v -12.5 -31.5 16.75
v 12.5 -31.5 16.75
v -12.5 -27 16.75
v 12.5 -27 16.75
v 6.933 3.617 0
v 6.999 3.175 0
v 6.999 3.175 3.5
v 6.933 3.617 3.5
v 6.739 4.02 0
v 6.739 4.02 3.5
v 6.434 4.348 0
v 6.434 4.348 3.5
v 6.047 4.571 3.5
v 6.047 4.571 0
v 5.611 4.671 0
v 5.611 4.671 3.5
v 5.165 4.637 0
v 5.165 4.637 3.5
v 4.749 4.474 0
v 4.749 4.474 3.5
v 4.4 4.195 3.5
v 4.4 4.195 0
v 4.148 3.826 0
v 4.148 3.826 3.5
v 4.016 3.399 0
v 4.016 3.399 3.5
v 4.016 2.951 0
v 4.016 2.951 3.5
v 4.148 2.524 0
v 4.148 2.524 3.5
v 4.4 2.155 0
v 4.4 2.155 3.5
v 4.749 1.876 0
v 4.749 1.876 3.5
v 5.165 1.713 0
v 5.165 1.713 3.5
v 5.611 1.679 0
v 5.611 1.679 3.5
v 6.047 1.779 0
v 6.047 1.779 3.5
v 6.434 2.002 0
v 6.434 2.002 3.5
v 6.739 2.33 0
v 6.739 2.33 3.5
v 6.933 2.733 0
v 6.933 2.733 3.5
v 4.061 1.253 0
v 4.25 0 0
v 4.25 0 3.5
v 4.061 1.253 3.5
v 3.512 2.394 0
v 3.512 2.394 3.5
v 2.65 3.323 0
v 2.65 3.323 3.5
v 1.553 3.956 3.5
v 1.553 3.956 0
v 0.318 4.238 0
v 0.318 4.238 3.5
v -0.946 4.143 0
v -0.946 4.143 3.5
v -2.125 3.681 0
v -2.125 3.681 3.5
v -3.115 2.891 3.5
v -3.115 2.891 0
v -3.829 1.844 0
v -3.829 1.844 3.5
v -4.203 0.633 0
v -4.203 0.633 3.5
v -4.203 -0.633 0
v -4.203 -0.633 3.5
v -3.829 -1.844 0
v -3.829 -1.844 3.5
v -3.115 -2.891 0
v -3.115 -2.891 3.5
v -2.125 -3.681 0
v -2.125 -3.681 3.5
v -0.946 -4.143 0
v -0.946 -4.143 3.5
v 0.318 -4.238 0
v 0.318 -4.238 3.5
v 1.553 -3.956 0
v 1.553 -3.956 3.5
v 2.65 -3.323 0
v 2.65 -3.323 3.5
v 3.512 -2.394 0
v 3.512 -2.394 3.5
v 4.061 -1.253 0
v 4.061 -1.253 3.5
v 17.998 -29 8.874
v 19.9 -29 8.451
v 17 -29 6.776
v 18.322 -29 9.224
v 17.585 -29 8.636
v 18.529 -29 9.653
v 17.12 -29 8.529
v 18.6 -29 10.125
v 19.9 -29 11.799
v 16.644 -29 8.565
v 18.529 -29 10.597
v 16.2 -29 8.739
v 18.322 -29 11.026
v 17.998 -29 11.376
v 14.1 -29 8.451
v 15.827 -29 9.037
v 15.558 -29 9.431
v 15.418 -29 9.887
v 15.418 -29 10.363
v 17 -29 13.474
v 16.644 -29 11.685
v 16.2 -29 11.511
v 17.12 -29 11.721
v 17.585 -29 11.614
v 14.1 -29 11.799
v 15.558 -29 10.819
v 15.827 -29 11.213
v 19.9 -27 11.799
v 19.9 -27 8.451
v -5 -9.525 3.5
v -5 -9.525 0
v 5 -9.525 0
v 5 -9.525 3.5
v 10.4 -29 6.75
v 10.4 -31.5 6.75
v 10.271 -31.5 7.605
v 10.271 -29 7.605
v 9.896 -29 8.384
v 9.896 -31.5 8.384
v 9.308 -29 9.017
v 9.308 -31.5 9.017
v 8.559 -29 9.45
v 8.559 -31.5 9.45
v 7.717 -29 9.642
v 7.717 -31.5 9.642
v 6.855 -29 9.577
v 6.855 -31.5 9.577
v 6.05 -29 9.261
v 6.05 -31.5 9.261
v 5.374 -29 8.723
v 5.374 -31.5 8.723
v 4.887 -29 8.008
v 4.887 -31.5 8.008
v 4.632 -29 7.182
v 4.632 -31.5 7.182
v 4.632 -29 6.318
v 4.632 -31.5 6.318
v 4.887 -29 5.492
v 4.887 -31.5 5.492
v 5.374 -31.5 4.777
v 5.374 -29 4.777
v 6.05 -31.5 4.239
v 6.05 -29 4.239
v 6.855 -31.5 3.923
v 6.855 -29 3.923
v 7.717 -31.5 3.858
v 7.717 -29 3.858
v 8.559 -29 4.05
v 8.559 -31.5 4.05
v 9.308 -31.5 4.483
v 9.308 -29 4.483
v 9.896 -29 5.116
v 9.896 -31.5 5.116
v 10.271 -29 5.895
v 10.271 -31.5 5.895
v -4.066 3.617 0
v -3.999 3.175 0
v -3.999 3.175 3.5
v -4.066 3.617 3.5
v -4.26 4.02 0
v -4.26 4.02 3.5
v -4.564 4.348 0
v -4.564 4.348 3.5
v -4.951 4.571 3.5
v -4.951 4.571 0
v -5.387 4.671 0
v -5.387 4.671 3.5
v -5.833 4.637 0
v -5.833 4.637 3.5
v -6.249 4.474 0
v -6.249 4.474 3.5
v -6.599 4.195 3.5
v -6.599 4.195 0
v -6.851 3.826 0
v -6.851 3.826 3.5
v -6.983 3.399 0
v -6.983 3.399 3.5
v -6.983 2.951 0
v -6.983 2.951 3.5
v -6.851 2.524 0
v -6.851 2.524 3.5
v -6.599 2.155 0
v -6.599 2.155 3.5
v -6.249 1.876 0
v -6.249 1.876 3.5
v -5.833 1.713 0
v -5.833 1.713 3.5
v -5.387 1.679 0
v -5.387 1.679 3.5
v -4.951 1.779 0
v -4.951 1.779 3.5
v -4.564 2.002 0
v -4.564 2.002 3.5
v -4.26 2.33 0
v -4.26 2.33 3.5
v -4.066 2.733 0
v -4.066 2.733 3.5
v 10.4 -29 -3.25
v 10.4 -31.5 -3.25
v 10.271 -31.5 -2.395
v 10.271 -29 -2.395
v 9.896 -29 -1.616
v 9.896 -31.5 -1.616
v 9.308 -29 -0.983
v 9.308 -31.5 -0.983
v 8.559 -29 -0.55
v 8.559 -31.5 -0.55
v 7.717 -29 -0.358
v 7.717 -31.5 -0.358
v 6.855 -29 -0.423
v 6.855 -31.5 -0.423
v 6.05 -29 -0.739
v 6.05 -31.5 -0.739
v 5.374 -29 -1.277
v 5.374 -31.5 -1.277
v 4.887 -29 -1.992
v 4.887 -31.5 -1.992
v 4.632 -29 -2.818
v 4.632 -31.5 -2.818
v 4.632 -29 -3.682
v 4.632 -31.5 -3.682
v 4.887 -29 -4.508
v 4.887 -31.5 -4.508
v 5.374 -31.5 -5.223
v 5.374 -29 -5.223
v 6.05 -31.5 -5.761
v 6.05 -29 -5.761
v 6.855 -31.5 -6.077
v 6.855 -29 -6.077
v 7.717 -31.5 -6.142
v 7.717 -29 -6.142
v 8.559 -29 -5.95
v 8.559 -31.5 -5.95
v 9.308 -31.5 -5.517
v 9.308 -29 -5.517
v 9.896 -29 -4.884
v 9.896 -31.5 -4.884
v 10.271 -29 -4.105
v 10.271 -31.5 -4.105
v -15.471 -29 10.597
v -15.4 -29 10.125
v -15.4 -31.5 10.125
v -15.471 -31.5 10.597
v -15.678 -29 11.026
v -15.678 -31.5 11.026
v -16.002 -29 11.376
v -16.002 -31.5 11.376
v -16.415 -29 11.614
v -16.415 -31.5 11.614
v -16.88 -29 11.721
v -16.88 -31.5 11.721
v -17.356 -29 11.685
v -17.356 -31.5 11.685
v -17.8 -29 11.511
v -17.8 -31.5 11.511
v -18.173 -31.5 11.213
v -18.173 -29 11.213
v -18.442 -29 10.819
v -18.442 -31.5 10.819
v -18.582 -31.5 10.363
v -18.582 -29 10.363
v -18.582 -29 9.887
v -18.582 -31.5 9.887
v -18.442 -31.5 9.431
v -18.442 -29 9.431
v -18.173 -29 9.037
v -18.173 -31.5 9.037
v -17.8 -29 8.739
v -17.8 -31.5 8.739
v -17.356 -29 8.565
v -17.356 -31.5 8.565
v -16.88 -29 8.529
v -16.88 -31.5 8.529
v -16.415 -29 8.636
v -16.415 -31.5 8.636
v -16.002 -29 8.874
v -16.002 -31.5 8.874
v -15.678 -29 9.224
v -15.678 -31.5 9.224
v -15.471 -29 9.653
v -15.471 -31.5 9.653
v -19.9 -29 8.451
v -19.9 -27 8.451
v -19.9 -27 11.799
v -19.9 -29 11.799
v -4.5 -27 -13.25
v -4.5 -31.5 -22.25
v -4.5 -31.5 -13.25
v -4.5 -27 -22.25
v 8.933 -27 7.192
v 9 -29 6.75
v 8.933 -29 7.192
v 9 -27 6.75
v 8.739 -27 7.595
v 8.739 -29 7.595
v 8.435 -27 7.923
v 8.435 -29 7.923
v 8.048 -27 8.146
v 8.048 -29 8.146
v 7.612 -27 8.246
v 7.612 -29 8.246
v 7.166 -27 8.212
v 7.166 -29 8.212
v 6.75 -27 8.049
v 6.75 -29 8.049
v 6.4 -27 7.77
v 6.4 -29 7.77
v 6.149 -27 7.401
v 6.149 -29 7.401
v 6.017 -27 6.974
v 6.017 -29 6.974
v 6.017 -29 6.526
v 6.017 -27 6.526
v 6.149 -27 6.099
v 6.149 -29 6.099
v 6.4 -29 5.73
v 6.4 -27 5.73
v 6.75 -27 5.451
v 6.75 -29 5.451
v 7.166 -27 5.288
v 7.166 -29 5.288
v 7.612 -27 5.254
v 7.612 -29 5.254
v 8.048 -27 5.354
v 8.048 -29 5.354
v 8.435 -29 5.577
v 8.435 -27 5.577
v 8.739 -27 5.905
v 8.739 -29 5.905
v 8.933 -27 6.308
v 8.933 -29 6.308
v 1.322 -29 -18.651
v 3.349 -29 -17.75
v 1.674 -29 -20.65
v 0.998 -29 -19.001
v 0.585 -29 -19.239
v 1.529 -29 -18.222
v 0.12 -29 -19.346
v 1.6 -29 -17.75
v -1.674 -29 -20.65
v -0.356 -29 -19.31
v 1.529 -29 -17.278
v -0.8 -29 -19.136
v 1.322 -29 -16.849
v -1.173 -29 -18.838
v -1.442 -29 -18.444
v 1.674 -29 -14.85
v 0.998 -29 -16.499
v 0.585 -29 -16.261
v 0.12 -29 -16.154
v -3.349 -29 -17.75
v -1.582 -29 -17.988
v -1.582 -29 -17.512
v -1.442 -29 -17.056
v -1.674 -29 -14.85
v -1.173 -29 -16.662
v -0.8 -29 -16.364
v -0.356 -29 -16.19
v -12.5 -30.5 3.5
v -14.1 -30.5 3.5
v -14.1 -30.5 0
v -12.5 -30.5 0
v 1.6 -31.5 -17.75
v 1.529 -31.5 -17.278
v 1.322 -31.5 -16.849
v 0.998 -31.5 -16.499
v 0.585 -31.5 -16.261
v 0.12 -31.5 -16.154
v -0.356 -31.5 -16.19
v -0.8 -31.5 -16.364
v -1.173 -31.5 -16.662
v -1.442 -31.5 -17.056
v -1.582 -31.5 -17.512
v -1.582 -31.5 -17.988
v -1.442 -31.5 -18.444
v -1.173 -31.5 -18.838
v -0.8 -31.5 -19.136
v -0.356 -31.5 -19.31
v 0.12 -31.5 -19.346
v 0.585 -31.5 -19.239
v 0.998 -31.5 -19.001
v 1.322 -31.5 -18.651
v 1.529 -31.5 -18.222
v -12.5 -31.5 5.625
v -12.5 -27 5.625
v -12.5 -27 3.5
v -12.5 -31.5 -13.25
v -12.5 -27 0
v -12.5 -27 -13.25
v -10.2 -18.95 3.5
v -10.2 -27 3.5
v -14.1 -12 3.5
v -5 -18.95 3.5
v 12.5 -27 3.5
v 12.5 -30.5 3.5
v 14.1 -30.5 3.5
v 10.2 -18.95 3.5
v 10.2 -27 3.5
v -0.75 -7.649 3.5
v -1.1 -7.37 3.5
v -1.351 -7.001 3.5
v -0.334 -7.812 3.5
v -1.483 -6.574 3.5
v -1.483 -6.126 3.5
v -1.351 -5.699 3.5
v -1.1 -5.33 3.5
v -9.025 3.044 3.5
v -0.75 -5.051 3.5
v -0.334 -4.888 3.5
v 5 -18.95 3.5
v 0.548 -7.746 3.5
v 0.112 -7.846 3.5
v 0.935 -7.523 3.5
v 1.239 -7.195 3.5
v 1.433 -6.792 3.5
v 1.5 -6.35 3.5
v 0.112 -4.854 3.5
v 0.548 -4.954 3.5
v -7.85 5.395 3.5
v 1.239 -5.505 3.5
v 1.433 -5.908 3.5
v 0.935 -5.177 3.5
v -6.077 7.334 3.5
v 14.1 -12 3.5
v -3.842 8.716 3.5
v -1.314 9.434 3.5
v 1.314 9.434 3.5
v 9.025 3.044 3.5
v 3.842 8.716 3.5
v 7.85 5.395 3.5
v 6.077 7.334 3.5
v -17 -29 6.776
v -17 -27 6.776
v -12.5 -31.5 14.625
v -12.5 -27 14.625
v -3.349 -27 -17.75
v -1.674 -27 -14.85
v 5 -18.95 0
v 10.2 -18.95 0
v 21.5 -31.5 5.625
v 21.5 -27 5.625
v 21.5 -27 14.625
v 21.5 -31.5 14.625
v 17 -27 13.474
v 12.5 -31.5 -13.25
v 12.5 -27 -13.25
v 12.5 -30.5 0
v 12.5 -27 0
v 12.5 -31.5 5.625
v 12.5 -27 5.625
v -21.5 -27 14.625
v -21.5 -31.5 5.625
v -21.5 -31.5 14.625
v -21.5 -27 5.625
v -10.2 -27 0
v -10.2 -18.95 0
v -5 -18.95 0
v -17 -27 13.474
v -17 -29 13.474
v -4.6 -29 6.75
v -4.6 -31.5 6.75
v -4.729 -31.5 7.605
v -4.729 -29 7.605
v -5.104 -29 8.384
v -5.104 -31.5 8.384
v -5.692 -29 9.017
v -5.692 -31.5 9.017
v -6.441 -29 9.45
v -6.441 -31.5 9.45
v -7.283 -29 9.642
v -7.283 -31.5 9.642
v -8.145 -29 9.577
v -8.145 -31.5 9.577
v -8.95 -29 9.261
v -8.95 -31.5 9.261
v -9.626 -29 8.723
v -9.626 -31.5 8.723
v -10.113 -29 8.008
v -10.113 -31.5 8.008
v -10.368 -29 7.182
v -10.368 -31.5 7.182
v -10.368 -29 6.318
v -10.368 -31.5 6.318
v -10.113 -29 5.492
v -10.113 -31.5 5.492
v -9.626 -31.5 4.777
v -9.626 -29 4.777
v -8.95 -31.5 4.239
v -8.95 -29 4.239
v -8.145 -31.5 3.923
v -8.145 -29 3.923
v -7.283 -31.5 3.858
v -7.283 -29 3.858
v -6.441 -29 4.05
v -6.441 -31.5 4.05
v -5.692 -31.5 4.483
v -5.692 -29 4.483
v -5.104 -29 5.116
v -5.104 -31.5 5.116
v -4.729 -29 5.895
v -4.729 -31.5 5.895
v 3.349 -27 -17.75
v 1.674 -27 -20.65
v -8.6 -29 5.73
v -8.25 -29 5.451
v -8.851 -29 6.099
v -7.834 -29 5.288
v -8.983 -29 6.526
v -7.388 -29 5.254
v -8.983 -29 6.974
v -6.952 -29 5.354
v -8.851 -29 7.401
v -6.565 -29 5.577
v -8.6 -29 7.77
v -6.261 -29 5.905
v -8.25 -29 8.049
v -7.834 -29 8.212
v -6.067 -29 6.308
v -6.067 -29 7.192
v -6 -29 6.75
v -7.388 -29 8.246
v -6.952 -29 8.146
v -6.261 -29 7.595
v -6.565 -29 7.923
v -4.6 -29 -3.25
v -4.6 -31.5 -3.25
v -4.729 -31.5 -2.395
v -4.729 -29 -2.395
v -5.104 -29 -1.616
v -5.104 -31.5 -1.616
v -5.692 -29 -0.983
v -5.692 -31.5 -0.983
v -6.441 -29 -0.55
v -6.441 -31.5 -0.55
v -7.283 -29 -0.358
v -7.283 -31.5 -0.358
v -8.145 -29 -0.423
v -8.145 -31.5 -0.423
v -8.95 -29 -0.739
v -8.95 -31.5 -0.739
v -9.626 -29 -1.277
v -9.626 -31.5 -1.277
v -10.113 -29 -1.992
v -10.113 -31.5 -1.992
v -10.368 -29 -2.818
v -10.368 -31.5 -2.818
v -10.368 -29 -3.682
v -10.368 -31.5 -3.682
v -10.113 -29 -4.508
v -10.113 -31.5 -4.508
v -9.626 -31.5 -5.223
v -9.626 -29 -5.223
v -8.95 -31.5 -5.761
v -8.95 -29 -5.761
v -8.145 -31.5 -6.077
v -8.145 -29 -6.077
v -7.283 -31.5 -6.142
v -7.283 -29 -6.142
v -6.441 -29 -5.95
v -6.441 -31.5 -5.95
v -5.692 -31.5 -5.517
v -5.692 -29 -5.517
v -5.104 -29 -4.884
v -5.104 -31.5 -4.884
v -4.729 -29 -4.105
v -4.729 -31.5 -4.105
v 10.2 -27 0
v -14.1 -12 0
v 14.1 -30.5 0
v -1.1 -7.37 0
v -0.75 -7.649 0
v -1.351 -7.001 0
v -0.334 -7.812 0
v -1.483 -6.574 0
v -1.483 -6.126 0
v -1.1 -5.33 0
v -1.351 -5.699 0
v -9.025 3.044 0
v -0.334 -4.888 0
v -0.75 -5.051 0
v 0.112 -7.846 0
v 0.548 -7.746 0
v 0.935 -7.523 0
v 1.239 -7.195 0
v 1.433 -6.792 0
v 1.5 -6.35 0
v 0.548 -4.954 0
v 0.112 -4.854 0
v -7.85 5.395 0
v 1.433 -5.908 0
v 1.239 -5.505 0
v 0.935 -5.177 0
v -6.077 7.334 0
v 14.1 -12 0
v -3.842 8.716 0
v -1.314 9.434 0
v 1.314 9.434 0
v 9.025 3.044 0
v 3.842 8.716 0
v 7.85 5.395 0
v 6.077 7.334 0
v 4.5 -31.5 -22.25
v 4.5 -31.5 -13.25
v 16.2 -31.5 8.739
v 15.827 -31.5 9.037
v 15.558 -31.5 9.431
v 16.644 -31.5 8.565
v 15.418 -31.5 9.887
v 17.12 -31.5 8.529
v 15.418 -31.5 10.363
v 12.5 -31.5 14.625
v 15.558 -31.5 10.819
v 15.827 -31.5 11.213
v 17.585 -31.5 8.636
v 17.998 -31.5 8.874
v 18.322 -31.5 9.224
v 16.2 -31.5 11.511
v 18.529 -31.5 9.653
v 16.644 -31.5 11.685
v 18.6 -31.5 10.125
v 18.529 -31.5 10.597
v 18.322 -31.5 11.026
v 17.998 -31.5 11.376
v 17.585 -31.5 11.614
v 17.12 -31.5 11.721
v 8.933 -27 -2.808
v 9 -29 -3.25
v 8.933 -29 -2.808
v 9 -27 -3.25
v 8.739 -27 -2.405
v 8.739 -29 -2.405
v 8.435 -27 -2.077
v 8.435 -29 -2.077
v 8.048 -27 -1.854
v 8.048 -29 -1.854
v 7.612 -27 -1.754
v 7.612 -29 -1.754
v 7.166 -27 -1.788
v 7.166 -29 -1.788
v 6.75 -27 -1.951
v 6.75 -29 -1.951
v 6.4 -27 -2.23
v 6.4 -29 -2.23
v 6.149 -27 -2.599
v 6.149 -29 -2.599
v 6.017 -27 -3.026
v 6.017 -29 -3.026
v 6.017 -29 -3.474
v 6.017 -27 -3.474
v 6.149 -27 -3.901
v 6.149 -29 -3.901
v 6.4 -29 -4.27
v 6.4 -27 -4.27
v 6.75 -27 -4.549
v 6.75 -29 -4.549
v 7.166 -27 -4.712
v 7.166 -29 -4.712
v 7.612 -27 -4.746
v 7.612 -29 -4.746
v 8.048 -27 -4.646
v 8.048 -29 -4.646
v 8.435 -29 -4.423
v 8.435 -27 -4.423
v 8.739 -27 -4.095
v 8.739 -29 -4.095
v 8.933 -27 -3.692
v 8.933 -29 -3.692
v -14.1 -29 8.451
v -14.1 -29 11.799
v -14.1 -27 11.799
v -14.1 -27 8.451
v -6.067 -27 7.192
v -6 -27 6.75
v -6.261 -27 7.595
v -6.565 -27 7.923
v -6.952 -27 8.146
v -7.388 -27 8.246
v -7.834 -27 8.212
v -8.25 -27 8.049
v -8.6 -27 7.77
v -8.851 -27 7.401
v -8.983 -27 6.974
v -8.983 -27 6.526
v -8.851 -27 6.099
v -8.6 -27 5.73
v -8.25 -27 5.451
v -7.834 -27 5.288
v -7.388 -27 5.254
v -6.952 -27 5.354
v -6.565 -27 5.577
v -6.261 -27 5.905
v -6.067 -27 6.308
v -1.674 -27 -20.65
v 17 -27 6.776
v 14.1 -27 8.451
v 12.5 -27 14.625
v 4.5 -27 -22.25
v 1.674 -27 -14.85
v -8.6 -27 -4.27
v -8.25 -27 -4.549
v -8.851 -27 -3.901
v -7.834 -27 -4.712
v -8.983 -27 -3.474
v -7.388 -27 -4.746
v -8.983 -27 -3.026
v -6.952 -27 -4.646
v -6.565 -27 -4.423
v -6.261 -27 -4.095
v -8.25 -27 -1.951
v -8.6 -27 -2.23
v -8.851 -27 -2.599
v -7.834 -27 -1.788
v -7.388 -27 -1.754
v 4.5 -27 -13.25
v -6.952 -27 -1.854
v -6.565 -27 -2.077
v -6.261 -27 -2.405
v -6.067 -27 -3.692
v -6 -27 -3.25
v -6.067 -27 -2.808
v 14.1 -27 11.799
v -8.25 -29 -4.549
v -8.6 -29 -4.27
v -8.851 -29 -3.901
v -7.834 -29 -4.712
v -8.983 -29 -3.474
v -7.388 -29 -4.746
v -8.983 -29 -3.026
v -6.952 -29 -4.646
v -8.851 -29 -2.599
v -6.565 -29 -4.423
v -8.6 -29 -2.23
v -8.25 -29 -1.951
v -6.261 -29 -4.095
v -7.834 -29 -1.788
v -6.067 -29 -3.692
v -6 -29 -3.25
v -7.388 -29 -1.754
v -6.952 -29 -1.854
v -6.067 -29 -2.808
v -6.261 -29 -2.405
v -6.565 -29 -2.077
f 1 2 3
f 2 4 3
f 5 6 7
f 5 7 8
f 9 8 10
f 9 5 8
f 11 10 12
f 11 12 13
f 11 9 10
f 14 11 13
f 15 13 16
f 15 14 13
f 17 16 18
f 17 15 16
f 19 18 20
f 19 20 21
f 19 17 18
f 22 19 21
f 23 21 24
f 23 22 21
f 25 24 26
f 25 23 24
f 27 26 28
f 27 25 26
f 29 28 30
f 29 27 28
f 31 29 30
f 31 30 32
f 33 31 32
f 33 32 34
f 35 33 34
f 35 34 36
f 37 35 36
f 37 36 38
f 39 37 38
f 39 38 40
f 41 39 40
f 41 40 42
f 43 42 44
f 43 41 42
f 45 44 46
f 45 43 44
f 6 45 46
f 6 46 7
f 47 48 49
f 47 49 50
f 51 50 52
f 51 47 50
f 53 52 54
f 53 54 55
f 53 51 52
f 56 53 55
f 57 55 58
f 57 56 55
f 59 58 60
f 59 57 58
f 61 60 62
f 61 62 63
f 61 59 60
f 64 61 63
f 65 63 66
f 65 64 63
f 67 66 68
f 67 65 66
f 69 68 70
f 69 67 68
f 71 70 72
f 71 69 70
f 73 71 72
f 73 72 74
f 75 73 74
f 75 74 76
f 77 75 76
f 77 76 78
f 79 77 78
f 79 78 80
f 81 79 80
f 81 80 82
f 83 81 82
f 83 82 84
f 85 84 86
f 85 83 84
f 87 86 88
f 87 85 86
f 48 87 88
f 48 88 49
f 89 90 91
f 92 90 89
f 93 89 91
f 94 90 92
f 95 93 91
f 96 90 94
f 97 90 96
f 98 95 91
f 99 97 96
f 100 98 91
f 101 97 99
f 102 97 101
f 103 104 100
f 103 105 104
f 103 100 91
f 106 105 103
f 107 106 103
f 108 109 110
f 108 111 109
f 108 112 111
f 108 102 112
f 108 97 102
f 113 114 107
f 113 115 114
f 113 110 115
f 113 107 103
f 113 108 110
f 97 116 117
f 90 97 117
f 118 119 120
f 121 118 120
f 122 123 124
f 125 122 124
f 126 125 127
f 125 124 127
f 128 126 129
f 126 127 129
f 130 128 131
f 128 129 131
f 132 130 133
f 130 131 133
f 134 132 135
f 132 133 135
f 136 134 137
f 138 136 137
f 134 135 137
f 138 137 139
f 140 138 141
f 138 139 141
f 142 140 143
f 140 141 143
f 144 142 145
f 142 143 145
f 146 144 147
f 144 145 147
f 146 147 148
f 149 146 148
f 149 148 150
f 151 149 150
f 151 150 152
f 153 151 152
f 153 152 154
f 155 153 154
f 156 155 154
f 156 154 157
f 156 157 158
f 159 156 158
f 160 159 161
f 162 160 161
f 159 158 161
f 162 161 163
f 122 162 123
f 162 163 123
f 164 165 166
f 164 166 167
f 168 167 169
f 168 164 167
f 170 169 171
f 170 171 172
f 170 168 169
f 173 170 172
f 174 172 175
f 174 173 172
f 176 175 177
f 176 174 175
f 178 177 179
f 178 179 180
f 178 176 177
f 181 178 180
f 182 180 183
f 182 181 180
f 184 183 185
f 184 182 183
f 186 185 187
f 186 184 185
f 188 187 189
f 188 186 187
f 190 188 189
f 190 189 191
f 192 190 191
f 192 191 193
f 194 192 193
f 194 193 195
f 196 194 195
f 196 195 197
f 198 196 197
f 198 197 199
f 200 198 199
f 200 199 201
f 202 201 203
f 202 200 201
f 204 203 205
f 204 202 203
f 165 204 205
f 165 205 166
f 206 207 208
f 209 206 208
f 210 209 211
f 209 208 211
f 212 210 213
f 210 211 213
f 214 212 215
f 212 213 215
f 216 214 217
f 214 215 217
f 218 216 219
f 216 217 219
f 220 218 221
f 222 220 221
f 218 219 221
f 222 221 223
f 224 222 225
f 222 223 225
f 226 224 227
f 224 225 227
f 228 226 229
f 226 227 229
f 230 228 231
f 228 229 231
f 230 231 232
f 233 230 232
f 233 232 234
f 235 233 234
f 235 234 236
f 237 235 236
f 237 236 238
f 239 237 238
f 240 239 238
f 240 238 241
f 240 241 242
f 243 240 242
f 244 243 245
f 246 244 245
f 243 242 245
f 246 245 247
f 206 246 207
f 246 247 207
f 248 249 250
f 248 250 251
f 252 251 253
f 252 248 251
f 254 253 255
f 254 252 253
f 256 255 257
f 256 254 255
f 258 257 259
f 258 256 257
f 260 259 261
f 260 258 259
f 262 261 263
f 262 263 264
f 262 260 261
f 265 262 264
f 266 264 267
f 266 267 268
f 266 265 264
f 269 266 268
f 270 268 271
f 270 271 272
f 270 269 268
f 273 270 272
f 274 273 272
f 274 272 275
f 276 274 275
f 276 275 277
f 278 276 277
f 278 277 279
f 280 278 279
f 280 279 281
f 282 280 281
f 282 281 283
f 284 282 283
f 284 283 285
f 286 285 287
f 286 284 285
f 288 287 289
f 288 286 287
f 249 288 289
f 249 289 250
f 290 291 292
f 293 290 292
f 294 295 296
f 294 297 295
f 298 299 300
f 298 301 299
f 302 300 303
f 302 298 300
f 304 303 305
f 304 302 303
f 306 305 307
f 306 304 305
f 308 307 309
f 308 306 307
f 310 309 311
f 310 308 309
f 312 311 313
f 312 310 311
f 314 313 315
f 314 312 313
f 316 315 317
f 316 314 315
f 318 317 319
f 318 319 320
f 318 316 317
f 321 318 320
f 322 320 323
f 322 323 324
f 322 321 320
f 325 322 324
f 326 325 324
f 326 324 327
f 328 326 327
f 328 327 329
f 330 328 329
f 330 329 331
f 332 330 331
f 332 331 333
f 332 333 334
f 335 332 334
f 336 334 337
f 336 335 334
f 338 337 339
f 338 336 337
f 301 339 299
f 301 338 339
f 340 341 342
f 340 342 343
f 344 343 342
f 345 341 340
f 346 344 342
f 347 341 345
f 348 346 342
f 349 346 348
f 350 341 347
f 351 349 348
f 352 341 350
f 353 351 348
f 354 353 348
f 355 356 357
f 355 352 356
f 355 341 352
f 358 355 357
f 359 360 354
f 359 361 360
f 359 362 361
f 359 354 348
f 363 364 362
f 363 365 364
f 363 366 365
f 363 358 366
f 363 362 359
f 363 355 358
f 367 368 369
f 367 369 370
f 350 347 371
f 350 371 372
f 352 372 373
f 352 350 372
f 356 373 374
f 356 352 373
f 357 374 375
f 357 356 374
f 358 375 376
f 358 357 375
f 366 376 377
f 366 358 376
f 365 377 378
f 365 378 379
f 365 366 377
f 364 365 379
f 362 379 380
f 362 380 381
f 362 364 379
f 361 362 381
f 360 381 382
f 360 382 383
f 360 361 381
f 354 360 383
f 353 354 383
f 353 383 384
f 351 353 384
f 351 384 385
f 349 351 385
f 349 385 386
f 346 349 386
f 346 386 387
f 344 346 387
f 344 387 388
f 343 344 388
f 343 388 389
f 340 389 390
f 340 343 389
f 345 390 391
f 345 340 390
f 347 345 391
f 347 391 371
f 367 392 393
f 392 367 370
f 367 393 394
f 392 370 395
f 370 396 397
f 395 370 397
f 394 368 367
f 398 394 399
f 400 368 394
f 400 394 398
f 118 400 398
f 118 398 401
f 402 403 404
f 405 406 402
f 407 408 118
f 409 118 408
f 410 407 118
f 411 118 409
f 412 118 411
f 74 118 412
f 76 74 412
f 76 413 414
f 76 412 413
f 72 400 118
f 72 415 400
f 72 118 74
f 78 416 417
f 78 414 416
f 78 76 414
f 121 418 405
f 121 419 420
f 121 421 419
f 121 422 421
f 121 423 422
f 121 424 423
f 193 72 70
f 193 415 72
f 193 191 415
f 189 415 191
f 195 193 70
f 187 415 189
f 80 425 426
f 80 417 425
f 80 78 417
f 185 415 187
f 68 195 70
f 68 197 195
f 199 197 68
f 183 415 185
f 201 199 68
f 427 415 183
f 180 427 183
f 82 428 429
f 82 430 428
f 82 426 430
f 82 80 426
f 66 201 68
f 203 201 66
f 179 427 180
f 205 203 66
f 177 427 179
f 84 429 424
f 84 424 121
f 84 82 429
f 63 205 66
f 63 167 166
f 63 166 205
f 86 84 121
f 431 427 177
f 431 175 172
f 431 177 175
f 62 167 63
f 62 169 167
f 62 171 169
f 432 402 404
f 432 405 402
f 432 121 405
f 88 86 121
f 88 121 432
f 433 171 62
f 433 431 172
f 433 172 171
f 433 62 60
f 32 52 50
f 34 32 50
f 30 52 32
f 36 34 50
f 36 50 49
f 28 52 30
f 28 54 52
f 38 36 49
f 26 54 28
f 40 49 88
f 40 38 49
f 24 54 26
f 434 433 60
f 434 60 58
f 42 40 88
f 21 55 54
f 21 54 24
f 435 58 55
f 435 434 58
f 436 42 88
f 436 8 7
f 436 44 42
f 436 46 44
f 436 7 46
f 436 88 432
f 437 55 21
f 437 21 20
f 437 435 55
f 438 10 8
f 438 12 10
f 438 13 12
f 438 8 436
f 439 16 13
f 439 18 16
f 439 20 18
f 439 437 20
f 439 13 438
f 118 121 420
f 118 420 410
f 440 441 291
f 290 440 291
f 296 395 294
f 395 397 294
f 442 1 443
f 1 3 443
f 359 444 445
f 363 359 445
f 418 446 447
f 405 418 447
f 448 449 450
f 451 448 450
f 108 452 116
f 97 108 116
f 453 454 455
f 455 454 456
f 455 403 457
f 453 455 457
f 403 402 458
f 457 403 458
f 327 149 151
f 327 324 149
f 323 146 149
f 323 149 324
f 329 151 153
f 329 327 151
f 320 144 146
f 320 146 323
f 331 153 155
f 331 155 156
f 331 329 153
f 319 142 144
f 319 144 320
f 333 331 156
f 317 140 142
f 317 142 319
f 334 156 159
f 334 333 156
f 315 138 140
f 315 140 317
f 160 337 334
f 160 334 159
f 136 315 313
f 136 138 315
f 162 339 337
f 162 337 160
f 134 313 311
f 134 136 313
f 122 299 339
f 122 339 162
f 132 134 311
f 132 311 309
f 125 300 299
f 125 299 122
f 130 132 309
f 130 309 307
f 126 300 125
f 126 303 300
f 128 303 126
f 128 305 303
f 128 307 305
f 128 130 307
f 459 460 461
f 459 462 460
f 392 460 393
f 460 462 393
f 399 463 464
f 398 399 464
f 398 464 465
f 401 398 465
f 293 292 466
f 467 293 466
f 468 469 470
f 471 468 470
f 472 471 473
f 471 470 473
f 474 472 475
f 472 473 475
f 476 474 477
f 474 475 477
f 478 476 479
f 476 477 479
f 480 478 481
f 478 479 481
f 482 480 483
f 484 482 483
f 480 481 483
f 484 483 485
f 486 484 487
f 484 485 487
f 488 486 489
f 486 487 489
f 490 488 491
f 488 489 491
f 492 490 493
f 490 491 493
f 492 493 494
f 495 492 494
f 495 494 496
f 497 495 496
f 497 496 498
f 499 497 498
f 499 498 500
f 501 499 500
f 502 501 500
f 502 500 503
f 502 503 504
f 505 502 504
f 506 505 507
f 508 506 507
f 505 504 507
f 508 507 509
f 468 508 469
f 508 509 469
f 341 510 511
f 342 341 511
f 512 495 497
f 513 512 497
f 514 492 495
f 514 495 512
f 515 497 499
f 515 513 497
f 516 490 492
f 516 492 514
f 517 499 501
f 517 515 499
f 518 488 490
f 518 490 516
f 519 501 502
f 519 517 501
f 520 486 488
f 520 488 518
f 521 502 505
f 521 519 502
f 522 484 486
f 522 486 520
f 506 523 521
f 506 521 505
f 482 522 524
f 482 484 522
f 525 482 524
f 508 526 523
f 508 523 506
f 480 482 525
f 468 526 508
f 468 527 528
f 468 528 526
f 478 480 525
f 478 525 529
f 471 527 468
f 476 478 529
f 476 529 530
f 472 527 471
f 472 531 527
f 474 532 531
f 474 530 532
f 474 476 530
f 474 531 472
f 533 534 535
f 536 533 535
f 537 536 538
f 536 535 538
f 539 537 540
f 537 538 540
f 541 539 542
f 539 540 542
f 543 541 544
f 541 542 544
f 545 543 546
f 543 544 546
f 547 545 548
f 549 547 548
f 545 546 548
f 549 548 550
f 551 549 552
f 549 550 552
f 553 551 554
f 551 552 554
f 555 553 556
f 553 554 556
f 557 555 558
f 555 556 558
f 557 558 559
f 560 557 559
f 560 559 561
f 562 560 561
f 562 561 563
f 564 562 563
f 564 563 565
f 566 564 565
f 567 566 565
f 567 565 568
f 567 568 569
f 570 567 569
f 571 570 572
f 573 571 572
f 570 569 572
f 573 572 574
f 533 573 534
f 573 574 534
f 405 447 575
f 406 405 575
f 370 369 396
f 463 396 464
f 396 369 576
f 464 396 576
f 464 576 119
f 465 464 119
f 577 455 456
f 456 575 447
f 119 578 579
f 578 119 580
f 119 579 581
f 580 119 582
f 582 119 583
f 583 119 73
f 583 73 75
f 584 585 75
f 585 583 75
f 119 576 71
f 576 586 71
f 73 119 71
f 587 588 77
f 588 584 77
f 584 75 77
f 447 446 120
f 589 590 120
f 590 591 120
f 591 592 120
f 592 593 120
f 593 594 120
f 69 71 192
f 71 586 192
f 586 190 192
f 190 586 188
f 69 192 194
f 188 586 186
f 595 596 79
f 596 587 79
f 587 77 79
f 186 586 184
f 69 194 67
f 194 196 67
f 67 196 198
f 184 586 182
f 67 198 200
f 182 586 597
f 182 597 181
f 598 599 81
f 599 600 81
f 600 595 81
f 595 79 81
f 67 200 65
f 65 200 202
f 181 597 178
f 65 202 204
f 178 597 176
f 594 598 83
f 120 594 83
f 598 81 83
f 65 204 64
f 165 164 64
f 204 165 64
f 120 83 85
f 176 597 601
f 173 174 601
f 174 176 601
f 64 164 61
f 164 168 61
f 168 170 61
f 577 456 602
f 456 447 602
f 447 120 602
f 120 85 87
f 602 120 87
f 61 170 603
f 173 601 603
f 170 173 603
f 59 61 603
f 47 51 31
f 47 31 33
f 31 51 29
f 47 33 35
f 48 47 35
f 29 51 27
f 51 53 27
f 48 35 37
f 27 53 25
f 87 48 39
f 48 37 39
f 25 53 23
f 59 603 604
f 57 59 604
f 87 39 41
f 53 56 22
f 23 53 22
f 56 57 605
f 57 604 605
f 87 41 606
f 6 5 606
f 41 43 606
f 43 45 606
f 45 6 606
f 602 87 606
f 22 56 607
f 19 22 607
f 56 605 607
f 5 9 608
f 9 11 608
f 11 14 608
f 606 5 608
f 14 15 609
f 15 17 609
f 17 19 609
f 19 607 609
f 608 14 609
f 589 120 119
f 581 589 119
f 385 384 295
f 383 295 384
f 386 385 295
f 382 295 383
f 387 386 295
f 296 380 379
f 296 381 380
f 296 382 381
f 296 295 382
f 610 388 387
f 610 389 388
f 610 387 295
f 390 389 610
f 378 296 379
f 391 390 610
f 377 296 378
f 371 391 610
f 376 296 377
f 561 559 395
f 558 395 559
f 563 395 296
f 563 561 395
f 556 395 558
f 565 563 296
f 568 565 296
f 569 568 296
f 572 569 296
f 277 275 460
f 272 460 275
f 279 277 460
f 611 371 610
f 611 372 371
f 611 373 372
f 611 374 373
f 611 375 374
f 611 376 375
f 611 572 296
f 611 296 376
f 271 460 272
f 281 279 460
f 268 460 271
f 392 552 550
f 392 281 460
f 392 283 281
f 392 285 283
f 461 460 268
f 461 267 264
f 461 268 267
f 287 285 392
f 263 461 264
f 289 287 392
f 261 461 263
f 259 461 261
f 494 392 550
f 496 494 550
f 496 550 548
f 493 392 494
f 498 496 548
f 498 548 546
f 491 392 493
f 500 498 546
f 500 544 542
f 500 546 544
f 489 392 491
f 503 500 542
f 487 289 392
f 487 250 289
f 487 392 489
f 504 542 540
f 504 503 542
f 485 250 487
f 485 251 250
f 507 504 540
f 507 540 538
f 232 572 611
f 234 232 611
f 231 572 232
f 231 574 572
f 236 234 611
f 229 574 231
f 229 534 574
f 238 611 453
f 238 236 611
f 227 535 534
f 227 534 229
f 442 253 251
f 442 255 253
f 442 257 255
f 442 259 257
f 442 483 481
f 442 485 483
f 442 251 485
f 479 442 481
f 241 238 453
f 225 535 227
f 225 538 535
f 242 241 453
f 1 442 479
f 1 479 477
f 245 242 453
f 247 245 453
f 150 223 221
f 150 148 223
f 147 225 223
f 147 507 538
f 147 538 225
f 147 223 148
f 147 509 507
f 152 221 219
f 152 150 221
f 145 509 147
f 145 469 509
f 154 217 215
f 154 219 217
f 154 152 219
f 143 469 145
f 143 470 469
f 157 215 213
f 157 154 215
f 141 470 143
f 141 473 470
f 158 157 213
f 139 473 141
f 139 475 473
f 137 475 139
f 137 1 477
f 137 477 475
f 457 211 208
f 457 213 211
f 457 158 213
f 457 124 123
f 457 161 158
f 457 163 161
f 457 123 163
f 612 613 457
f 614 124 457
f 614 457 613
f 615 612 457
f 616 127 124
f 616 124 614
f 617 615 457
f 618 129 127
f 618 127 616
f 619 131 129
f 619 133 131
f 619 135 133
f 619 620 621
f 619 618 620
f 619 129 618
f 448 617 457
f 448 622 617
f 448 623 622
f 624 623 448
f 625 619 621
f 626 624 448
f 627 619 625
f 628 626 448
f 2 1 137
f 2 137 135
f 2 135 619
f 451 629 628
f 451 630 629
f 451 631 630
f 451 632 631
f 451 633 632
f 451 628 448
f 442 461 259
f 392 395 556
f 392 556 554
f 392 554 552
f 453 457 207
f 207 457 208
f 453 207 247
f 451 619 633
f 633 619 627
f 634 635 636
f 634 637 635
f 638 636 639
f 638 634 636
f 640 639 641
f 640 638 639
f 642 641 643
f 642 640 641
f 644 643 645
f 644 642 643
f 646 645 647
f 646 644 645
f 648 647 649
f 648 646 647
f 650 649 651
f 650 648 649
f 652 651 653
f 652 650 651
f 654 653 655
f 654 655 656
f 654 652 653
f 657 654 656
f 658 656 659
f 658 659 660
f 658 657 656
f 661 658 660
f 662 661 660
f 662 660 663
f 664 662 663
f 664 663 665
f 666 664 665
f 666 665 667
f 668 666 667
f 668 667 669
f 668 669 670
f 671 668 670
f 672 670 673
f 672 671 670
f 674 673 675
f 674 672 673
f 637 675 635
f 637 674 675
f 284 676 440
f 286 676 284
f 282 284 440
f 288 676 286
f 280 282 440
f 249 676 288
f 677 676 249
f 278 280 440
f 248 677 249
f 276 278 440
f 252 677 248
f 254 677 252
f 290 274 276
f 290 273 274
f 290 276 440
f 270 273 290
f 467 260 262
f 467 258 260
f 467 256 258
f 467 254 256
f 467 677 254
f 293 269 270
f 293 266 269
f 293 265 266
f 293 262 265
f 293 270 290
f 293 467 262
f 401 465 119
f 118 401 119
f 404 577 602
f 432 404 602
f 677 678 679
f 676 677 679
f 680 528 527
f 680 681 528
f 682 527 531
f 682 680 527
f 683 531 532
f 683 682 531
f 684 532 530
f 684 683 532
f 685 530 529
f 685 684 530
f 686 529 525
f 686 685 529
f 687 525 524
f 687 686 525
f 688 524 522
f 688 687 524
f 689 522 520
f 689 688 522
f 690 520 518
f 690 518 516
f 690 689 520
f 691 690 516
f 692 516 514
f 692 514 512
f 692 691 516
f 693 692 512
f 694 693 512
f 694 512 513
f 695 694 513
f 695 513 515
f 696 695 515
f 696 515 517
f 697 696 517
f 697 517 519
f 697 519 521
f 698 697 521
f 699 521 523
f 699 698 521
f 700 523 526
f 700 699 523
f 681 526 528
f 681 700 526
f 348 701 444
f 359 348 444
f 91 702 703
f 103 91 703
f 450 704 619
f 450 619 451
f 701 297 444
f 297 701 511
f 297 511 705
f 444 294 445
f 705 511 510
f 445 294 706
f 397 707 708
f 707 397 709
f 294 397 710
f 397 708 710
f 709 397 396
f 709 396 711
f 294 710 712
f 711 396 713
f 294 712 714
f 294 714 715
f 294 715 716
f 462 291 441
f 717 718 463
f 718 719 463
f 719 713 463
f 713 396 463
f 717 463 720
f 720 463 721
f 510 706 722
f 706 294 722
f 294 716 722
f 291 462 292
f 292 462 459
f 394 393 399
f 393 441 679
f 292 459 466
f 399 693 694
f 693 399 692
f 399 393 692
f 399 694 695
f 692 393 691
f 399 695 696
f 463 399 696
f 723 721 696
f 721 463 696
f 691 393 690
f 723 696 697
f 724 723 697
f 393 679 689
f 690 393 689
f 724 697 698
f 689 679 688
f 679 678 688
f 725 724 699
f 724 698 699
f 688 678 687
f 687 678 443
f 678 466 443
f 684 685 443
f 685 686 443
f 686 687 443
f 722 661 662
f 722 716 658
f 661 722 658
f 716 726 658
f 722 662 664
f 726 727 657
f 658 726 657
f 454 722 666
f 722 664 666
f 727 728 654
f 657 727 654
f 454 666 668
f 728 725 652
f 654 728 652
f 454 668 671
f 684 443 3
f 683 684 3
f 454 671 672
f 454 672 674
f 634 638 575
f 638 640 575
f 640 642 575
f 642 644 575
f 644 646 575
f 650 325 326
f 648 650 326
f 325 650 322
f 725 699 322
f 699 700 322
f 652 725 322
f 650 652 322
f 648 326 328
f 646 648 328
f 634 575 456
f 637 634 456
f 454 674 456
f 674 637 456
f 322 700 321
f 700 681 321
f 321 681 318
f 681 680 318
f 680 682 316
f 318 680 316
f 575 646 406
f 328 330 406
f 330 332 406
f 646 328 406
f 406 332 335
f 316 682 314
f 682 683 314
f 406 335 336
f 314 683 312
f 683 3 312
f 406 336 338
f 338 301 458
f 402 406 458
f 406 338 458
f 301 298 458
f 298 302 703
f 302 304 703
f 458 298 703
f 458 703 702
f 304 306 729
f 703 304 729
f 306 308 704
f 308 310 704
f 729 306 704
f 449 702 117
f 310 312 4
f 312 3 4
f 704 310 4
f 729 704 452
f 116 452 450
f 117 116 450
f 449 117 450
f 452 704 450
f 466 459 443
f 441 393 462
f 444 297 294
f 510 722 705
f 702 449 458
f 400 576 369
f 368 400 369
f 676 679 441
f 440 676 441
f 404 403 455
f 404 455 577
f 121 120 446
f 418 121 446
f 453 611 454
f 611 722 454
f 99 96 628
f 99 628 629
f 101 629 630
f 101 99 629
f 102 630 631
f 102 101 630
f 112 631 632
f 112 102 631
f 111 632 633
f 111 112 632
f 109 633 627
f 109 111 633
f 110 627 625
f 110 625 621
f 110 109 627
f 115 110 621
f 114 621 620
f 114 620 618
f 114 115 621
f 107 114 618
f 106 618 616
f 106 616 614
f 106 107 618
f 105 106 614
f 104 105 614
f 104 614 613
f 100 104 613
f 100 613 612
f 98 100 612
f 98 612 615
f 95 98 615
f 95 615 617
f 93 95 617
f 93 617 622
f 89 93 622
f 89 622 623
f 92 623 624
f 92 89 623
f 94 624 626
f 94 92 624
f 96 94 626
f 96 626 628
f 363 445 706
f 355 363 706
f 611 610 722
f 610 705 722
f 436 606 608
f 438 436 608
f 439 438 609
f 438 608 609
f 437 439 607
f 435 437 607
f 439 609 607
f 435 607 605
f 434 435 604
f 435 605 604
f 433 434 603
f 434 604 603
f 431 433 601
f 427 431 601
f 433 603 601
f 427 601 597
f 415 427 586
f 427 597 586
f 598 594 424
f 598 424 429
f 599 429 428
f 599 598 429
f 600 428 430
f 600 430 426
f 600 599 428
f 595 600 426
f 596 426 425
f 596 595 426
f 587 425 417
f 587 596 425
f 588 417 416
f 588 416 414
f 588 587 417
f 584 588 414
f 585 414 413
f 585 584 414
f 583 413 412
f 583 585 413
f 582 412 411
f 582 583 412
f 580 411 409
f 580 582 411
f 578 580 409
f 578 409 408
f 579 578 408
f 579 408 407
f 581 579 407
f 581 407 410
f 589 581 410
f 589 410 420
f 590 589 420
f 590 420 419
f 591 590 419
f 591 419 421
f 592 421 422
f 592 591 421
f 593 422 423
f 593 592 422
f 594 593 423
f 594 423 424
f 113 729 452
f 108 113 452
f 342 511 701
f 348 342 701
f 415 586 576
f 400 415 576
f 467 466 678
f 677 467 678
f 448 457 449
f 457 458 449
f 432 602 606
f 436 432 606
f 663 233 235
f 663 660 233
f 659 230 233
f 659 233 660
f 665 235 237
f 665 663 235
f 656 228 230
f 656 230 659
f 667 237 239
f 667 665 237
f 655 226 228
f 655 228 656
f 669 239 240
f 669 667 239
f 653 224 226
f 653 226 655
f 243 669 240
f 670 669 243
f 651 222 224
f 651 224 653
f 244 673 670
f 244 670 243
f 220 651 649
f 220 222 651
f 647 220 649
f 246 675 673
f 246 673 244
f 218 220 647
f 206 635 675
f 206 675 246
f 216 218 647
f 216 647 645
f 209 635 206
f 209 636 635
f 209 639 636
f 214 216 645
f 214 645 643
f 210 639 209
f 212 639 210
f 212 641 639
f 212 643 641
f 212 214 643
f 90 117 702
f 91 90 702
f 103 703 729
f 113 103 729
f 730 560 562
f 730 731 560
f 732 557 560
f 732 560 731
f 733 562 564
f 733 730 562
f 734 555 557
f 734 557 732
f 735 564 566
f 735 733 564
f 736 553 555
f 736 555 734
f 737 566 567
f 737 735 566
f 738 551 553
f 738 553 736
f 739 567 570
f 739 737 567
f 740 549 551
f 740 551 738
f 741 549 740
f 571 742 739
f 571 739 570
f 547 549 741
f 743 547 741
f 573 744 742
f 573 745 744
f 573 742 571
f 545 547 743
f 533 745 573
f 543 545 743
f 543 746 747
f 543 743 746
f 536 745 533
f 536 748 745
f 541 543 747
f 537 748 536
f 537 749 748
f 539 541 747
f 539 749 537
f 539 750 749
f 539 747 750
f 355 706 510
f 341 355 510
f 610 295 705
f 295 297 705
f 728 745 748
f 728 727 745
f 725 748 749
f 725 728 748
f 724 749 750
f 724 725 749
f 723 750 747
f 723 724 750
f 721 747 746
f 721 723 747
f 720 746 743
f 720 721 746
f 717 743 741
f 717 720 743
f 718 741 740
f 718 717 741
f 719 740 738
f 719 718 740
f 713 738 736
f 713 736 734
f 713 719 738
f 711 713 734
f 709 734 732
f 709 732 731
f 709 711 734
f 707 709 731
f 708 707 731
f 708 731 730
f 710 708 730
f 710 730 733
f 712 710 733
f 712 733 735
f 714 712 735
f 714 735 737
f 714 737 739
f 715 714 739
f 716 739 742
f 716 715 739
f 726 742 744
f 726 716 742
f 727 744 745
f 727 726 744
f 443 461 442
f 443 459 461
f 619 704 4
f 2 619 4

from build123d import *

# Parameters (mm, degrees)
F0_R          = 1.5
F0_R_2        = 4.25
F1_DEPTH      = 3.5
F2_R          = 1.5
F2_W          = 9
F2_H          = 9
F2_R_2        = 1.6
F2_W_2        = 25
F2_H_2        = 3.5
F3_DEPTH      = 3.5
F3_DEPTH_BACK = 1
F4_R          = 1.6
F5_DEPTH      = 2
F6_R          = 2.9
F6_R_2        = 1.5
F7_DEPTH      = 2.5


# Not quite as in the source:
# - a feature names something its author has since deleted; it is built from what else it names


with BuildPart() as f1:
    # F0 (on Top) → F1 (new body)
    with BuildSketch(Plane.XY):
        with BuildLine():
            Line((-14.1, -30.5), (0, -30.5))
            Line((0, -30.5), (14.1, -30.5))
            Line((14.1, -30.5), (14.1, -12))
            Line((14.1, -12), (9.025382269, 3.044355416))
            ThreePointArc((9.025382269, 3.044355416), (0, 9.525), (-9.025382269, 3.044355416))
            Line((-9.025382269, 3.044355416), (-14.1, -12))
            Line((-14.1, -12), (-14.1, -30.5))
        make_face()
        Polygon((10.2, -27), (0, -27), (-10.2, -27), (-10.2, -18.95), (-5, -18.95), (-5, -9.525), (0, -9.525), (5, -9.525), (5, -18.95), (10.2, -18.95), align=None, mode=Mode.SUBTRACT)
        with Locations((-5.499261314, 3.175)):
            Circle(F0_R, mode=Mode.SUBTRACT)
        with Locations((0, -6.35)):
            Circle(F0_R, mode=Mode.SUBTRACT)
        Circle(F0_R_2, mode=Mode.SUBTRACT)
        with Locations((5.499261314, 3.175)):
            Circle(F0_R, mode=Mode.SUBTRACT)
    extrude(amount=F1_DEPTH)

    # F2 (on face) → F3 (join, two sides)
    with BuildSketch(Plane.XZ.offset(30.5)) as f3_sk:
        Polygon((12.5, 16.75), (-12.5, 16.75), (-12.5, 14.625), (-12.5, 5.625), (-12.5, 3.5), (12.5, 3.5), (12.5, 5.625), (12.5, 14.625), align=None)
        with Locations((-7.5, 6.75)):
            Circle(F2_R, mode=Mode.SUBTRACT)
        with Locations((7.5, 6.75)):
            Circle(F2_R, mode=Mode.SUBTRACT)
        Polygon((12.5, 0), (-12.5, 0), (-12.5, -13.25), (-4.5, -13.25), (4.5, -13.25), (12.5, -13.25), align=None)
        with Locations((-7.5, -3.25)):
            Circle(F2_R, mode=Mode.SUBTRACT)
        with Locations((7.5, -3.25)):
            Circle(F2_R, mode=Mode.SUBTRACT)
        with Locations((-17, 10.125)):
            Rectangle(F2_W, F2_H)
        with Locations((-17, 10.125)):
            Circle(F2_R_2, mode=Mode.SUBTRACT)
        with Locations((17, 10.125)):
            Rectangle(F2_W, F2_H)
        with Locations((17, 10.125)):
            Circle(F2_R_2, mode=Mode.SUBTRACT)
        with Locations((0, -17.75)):
            Rectangle(F2_W, F2_H)
        with Locations((0, -17.75)):
            Circle(F2_R_2, mode=Mode.SUBTRACT)
        with Locations((0, 1.75)):
            Rectangle(F2_W_2, F2_H_2)
    extrude(amount=-F3_DEPTH)
    extrude(f3_sk.sketch, amount=F3_DEPTH_BACK)

    # F4 (on face) → F5 (cut)
    with BuildSketch(Plane(origin=(0, -27, 0), x_dir=(-1, 0, 0), z_dir=(0, 1, 0))):
        Polygon((-19.9, 11.7993157806), (-19.9, 8.4506842194), (-17, 6.7763684387), (-14.1, 8.4506842194), (-14.1, 11.7993157806), (-17, 13.4736315613), align=None)
        with Locations((-17, 10.125)):
            Circle(F4_R, mode=Mode.SUBTRACT)
        Polygon((17, 13.4736315613), (14.1, 11.7993157806), (14.1, 8.4506842194), (17, 6.7763684387), (19.9, 8.4506842194), (19.9, 11.7993157806), align=None)
        with Locations((17, 10.125)):
            Circle(F4_R, mode=Mode.SUBTRACT)
        Polygon((1.6743157806, -14.85), (-1.6743157806, -14.85), (-3.3486315613, -17.75), (-1.6743157806, -20.65), (1.6743157806, -20.65), (3.3486315613, -17.75), align=None)
        with Locations((0, -17.75)):
            Circle(F4_R, mode=Mode.SUBTRACT)
    extrude(amount=-F5_DEPTH, mode=Mode.SUBTRACT)

    # F6 (on face) → F7 (cut)
    with BuildSketch(Plane.XZ.offset(31.5)):
        with Locations((-7.5, 6.75)):
            Circle(F6_R)
        with Locations((-7.5, 6.75)):
            Circle(F6_R_2, mode=Mode.SUBTRACT)
        with Locations((7.5, 6.75)):
            Circle(F6_R)
        with Locations((7.5, 6.75)):
            Circle(F6_R_2, mode=Mode.SUBTRACT)
        with Locations((7.5, -3.25)):
            Circle(F6_R)
        with Locations((7.5, -3.25)):
            Circle(F6_R_2, mode=Mode.SUBTRACT)
        with Locations((-7.5, -3.25)):
            Circle(F6_R)
        with Locations((-7.5, -3.25)):
            Circle(F6_R_2, mode=Mode.SUBTRACT)
    extrude(amount=-F7_DEPTH, mode=Mode.SUBTRACT)


solid = f1.part
